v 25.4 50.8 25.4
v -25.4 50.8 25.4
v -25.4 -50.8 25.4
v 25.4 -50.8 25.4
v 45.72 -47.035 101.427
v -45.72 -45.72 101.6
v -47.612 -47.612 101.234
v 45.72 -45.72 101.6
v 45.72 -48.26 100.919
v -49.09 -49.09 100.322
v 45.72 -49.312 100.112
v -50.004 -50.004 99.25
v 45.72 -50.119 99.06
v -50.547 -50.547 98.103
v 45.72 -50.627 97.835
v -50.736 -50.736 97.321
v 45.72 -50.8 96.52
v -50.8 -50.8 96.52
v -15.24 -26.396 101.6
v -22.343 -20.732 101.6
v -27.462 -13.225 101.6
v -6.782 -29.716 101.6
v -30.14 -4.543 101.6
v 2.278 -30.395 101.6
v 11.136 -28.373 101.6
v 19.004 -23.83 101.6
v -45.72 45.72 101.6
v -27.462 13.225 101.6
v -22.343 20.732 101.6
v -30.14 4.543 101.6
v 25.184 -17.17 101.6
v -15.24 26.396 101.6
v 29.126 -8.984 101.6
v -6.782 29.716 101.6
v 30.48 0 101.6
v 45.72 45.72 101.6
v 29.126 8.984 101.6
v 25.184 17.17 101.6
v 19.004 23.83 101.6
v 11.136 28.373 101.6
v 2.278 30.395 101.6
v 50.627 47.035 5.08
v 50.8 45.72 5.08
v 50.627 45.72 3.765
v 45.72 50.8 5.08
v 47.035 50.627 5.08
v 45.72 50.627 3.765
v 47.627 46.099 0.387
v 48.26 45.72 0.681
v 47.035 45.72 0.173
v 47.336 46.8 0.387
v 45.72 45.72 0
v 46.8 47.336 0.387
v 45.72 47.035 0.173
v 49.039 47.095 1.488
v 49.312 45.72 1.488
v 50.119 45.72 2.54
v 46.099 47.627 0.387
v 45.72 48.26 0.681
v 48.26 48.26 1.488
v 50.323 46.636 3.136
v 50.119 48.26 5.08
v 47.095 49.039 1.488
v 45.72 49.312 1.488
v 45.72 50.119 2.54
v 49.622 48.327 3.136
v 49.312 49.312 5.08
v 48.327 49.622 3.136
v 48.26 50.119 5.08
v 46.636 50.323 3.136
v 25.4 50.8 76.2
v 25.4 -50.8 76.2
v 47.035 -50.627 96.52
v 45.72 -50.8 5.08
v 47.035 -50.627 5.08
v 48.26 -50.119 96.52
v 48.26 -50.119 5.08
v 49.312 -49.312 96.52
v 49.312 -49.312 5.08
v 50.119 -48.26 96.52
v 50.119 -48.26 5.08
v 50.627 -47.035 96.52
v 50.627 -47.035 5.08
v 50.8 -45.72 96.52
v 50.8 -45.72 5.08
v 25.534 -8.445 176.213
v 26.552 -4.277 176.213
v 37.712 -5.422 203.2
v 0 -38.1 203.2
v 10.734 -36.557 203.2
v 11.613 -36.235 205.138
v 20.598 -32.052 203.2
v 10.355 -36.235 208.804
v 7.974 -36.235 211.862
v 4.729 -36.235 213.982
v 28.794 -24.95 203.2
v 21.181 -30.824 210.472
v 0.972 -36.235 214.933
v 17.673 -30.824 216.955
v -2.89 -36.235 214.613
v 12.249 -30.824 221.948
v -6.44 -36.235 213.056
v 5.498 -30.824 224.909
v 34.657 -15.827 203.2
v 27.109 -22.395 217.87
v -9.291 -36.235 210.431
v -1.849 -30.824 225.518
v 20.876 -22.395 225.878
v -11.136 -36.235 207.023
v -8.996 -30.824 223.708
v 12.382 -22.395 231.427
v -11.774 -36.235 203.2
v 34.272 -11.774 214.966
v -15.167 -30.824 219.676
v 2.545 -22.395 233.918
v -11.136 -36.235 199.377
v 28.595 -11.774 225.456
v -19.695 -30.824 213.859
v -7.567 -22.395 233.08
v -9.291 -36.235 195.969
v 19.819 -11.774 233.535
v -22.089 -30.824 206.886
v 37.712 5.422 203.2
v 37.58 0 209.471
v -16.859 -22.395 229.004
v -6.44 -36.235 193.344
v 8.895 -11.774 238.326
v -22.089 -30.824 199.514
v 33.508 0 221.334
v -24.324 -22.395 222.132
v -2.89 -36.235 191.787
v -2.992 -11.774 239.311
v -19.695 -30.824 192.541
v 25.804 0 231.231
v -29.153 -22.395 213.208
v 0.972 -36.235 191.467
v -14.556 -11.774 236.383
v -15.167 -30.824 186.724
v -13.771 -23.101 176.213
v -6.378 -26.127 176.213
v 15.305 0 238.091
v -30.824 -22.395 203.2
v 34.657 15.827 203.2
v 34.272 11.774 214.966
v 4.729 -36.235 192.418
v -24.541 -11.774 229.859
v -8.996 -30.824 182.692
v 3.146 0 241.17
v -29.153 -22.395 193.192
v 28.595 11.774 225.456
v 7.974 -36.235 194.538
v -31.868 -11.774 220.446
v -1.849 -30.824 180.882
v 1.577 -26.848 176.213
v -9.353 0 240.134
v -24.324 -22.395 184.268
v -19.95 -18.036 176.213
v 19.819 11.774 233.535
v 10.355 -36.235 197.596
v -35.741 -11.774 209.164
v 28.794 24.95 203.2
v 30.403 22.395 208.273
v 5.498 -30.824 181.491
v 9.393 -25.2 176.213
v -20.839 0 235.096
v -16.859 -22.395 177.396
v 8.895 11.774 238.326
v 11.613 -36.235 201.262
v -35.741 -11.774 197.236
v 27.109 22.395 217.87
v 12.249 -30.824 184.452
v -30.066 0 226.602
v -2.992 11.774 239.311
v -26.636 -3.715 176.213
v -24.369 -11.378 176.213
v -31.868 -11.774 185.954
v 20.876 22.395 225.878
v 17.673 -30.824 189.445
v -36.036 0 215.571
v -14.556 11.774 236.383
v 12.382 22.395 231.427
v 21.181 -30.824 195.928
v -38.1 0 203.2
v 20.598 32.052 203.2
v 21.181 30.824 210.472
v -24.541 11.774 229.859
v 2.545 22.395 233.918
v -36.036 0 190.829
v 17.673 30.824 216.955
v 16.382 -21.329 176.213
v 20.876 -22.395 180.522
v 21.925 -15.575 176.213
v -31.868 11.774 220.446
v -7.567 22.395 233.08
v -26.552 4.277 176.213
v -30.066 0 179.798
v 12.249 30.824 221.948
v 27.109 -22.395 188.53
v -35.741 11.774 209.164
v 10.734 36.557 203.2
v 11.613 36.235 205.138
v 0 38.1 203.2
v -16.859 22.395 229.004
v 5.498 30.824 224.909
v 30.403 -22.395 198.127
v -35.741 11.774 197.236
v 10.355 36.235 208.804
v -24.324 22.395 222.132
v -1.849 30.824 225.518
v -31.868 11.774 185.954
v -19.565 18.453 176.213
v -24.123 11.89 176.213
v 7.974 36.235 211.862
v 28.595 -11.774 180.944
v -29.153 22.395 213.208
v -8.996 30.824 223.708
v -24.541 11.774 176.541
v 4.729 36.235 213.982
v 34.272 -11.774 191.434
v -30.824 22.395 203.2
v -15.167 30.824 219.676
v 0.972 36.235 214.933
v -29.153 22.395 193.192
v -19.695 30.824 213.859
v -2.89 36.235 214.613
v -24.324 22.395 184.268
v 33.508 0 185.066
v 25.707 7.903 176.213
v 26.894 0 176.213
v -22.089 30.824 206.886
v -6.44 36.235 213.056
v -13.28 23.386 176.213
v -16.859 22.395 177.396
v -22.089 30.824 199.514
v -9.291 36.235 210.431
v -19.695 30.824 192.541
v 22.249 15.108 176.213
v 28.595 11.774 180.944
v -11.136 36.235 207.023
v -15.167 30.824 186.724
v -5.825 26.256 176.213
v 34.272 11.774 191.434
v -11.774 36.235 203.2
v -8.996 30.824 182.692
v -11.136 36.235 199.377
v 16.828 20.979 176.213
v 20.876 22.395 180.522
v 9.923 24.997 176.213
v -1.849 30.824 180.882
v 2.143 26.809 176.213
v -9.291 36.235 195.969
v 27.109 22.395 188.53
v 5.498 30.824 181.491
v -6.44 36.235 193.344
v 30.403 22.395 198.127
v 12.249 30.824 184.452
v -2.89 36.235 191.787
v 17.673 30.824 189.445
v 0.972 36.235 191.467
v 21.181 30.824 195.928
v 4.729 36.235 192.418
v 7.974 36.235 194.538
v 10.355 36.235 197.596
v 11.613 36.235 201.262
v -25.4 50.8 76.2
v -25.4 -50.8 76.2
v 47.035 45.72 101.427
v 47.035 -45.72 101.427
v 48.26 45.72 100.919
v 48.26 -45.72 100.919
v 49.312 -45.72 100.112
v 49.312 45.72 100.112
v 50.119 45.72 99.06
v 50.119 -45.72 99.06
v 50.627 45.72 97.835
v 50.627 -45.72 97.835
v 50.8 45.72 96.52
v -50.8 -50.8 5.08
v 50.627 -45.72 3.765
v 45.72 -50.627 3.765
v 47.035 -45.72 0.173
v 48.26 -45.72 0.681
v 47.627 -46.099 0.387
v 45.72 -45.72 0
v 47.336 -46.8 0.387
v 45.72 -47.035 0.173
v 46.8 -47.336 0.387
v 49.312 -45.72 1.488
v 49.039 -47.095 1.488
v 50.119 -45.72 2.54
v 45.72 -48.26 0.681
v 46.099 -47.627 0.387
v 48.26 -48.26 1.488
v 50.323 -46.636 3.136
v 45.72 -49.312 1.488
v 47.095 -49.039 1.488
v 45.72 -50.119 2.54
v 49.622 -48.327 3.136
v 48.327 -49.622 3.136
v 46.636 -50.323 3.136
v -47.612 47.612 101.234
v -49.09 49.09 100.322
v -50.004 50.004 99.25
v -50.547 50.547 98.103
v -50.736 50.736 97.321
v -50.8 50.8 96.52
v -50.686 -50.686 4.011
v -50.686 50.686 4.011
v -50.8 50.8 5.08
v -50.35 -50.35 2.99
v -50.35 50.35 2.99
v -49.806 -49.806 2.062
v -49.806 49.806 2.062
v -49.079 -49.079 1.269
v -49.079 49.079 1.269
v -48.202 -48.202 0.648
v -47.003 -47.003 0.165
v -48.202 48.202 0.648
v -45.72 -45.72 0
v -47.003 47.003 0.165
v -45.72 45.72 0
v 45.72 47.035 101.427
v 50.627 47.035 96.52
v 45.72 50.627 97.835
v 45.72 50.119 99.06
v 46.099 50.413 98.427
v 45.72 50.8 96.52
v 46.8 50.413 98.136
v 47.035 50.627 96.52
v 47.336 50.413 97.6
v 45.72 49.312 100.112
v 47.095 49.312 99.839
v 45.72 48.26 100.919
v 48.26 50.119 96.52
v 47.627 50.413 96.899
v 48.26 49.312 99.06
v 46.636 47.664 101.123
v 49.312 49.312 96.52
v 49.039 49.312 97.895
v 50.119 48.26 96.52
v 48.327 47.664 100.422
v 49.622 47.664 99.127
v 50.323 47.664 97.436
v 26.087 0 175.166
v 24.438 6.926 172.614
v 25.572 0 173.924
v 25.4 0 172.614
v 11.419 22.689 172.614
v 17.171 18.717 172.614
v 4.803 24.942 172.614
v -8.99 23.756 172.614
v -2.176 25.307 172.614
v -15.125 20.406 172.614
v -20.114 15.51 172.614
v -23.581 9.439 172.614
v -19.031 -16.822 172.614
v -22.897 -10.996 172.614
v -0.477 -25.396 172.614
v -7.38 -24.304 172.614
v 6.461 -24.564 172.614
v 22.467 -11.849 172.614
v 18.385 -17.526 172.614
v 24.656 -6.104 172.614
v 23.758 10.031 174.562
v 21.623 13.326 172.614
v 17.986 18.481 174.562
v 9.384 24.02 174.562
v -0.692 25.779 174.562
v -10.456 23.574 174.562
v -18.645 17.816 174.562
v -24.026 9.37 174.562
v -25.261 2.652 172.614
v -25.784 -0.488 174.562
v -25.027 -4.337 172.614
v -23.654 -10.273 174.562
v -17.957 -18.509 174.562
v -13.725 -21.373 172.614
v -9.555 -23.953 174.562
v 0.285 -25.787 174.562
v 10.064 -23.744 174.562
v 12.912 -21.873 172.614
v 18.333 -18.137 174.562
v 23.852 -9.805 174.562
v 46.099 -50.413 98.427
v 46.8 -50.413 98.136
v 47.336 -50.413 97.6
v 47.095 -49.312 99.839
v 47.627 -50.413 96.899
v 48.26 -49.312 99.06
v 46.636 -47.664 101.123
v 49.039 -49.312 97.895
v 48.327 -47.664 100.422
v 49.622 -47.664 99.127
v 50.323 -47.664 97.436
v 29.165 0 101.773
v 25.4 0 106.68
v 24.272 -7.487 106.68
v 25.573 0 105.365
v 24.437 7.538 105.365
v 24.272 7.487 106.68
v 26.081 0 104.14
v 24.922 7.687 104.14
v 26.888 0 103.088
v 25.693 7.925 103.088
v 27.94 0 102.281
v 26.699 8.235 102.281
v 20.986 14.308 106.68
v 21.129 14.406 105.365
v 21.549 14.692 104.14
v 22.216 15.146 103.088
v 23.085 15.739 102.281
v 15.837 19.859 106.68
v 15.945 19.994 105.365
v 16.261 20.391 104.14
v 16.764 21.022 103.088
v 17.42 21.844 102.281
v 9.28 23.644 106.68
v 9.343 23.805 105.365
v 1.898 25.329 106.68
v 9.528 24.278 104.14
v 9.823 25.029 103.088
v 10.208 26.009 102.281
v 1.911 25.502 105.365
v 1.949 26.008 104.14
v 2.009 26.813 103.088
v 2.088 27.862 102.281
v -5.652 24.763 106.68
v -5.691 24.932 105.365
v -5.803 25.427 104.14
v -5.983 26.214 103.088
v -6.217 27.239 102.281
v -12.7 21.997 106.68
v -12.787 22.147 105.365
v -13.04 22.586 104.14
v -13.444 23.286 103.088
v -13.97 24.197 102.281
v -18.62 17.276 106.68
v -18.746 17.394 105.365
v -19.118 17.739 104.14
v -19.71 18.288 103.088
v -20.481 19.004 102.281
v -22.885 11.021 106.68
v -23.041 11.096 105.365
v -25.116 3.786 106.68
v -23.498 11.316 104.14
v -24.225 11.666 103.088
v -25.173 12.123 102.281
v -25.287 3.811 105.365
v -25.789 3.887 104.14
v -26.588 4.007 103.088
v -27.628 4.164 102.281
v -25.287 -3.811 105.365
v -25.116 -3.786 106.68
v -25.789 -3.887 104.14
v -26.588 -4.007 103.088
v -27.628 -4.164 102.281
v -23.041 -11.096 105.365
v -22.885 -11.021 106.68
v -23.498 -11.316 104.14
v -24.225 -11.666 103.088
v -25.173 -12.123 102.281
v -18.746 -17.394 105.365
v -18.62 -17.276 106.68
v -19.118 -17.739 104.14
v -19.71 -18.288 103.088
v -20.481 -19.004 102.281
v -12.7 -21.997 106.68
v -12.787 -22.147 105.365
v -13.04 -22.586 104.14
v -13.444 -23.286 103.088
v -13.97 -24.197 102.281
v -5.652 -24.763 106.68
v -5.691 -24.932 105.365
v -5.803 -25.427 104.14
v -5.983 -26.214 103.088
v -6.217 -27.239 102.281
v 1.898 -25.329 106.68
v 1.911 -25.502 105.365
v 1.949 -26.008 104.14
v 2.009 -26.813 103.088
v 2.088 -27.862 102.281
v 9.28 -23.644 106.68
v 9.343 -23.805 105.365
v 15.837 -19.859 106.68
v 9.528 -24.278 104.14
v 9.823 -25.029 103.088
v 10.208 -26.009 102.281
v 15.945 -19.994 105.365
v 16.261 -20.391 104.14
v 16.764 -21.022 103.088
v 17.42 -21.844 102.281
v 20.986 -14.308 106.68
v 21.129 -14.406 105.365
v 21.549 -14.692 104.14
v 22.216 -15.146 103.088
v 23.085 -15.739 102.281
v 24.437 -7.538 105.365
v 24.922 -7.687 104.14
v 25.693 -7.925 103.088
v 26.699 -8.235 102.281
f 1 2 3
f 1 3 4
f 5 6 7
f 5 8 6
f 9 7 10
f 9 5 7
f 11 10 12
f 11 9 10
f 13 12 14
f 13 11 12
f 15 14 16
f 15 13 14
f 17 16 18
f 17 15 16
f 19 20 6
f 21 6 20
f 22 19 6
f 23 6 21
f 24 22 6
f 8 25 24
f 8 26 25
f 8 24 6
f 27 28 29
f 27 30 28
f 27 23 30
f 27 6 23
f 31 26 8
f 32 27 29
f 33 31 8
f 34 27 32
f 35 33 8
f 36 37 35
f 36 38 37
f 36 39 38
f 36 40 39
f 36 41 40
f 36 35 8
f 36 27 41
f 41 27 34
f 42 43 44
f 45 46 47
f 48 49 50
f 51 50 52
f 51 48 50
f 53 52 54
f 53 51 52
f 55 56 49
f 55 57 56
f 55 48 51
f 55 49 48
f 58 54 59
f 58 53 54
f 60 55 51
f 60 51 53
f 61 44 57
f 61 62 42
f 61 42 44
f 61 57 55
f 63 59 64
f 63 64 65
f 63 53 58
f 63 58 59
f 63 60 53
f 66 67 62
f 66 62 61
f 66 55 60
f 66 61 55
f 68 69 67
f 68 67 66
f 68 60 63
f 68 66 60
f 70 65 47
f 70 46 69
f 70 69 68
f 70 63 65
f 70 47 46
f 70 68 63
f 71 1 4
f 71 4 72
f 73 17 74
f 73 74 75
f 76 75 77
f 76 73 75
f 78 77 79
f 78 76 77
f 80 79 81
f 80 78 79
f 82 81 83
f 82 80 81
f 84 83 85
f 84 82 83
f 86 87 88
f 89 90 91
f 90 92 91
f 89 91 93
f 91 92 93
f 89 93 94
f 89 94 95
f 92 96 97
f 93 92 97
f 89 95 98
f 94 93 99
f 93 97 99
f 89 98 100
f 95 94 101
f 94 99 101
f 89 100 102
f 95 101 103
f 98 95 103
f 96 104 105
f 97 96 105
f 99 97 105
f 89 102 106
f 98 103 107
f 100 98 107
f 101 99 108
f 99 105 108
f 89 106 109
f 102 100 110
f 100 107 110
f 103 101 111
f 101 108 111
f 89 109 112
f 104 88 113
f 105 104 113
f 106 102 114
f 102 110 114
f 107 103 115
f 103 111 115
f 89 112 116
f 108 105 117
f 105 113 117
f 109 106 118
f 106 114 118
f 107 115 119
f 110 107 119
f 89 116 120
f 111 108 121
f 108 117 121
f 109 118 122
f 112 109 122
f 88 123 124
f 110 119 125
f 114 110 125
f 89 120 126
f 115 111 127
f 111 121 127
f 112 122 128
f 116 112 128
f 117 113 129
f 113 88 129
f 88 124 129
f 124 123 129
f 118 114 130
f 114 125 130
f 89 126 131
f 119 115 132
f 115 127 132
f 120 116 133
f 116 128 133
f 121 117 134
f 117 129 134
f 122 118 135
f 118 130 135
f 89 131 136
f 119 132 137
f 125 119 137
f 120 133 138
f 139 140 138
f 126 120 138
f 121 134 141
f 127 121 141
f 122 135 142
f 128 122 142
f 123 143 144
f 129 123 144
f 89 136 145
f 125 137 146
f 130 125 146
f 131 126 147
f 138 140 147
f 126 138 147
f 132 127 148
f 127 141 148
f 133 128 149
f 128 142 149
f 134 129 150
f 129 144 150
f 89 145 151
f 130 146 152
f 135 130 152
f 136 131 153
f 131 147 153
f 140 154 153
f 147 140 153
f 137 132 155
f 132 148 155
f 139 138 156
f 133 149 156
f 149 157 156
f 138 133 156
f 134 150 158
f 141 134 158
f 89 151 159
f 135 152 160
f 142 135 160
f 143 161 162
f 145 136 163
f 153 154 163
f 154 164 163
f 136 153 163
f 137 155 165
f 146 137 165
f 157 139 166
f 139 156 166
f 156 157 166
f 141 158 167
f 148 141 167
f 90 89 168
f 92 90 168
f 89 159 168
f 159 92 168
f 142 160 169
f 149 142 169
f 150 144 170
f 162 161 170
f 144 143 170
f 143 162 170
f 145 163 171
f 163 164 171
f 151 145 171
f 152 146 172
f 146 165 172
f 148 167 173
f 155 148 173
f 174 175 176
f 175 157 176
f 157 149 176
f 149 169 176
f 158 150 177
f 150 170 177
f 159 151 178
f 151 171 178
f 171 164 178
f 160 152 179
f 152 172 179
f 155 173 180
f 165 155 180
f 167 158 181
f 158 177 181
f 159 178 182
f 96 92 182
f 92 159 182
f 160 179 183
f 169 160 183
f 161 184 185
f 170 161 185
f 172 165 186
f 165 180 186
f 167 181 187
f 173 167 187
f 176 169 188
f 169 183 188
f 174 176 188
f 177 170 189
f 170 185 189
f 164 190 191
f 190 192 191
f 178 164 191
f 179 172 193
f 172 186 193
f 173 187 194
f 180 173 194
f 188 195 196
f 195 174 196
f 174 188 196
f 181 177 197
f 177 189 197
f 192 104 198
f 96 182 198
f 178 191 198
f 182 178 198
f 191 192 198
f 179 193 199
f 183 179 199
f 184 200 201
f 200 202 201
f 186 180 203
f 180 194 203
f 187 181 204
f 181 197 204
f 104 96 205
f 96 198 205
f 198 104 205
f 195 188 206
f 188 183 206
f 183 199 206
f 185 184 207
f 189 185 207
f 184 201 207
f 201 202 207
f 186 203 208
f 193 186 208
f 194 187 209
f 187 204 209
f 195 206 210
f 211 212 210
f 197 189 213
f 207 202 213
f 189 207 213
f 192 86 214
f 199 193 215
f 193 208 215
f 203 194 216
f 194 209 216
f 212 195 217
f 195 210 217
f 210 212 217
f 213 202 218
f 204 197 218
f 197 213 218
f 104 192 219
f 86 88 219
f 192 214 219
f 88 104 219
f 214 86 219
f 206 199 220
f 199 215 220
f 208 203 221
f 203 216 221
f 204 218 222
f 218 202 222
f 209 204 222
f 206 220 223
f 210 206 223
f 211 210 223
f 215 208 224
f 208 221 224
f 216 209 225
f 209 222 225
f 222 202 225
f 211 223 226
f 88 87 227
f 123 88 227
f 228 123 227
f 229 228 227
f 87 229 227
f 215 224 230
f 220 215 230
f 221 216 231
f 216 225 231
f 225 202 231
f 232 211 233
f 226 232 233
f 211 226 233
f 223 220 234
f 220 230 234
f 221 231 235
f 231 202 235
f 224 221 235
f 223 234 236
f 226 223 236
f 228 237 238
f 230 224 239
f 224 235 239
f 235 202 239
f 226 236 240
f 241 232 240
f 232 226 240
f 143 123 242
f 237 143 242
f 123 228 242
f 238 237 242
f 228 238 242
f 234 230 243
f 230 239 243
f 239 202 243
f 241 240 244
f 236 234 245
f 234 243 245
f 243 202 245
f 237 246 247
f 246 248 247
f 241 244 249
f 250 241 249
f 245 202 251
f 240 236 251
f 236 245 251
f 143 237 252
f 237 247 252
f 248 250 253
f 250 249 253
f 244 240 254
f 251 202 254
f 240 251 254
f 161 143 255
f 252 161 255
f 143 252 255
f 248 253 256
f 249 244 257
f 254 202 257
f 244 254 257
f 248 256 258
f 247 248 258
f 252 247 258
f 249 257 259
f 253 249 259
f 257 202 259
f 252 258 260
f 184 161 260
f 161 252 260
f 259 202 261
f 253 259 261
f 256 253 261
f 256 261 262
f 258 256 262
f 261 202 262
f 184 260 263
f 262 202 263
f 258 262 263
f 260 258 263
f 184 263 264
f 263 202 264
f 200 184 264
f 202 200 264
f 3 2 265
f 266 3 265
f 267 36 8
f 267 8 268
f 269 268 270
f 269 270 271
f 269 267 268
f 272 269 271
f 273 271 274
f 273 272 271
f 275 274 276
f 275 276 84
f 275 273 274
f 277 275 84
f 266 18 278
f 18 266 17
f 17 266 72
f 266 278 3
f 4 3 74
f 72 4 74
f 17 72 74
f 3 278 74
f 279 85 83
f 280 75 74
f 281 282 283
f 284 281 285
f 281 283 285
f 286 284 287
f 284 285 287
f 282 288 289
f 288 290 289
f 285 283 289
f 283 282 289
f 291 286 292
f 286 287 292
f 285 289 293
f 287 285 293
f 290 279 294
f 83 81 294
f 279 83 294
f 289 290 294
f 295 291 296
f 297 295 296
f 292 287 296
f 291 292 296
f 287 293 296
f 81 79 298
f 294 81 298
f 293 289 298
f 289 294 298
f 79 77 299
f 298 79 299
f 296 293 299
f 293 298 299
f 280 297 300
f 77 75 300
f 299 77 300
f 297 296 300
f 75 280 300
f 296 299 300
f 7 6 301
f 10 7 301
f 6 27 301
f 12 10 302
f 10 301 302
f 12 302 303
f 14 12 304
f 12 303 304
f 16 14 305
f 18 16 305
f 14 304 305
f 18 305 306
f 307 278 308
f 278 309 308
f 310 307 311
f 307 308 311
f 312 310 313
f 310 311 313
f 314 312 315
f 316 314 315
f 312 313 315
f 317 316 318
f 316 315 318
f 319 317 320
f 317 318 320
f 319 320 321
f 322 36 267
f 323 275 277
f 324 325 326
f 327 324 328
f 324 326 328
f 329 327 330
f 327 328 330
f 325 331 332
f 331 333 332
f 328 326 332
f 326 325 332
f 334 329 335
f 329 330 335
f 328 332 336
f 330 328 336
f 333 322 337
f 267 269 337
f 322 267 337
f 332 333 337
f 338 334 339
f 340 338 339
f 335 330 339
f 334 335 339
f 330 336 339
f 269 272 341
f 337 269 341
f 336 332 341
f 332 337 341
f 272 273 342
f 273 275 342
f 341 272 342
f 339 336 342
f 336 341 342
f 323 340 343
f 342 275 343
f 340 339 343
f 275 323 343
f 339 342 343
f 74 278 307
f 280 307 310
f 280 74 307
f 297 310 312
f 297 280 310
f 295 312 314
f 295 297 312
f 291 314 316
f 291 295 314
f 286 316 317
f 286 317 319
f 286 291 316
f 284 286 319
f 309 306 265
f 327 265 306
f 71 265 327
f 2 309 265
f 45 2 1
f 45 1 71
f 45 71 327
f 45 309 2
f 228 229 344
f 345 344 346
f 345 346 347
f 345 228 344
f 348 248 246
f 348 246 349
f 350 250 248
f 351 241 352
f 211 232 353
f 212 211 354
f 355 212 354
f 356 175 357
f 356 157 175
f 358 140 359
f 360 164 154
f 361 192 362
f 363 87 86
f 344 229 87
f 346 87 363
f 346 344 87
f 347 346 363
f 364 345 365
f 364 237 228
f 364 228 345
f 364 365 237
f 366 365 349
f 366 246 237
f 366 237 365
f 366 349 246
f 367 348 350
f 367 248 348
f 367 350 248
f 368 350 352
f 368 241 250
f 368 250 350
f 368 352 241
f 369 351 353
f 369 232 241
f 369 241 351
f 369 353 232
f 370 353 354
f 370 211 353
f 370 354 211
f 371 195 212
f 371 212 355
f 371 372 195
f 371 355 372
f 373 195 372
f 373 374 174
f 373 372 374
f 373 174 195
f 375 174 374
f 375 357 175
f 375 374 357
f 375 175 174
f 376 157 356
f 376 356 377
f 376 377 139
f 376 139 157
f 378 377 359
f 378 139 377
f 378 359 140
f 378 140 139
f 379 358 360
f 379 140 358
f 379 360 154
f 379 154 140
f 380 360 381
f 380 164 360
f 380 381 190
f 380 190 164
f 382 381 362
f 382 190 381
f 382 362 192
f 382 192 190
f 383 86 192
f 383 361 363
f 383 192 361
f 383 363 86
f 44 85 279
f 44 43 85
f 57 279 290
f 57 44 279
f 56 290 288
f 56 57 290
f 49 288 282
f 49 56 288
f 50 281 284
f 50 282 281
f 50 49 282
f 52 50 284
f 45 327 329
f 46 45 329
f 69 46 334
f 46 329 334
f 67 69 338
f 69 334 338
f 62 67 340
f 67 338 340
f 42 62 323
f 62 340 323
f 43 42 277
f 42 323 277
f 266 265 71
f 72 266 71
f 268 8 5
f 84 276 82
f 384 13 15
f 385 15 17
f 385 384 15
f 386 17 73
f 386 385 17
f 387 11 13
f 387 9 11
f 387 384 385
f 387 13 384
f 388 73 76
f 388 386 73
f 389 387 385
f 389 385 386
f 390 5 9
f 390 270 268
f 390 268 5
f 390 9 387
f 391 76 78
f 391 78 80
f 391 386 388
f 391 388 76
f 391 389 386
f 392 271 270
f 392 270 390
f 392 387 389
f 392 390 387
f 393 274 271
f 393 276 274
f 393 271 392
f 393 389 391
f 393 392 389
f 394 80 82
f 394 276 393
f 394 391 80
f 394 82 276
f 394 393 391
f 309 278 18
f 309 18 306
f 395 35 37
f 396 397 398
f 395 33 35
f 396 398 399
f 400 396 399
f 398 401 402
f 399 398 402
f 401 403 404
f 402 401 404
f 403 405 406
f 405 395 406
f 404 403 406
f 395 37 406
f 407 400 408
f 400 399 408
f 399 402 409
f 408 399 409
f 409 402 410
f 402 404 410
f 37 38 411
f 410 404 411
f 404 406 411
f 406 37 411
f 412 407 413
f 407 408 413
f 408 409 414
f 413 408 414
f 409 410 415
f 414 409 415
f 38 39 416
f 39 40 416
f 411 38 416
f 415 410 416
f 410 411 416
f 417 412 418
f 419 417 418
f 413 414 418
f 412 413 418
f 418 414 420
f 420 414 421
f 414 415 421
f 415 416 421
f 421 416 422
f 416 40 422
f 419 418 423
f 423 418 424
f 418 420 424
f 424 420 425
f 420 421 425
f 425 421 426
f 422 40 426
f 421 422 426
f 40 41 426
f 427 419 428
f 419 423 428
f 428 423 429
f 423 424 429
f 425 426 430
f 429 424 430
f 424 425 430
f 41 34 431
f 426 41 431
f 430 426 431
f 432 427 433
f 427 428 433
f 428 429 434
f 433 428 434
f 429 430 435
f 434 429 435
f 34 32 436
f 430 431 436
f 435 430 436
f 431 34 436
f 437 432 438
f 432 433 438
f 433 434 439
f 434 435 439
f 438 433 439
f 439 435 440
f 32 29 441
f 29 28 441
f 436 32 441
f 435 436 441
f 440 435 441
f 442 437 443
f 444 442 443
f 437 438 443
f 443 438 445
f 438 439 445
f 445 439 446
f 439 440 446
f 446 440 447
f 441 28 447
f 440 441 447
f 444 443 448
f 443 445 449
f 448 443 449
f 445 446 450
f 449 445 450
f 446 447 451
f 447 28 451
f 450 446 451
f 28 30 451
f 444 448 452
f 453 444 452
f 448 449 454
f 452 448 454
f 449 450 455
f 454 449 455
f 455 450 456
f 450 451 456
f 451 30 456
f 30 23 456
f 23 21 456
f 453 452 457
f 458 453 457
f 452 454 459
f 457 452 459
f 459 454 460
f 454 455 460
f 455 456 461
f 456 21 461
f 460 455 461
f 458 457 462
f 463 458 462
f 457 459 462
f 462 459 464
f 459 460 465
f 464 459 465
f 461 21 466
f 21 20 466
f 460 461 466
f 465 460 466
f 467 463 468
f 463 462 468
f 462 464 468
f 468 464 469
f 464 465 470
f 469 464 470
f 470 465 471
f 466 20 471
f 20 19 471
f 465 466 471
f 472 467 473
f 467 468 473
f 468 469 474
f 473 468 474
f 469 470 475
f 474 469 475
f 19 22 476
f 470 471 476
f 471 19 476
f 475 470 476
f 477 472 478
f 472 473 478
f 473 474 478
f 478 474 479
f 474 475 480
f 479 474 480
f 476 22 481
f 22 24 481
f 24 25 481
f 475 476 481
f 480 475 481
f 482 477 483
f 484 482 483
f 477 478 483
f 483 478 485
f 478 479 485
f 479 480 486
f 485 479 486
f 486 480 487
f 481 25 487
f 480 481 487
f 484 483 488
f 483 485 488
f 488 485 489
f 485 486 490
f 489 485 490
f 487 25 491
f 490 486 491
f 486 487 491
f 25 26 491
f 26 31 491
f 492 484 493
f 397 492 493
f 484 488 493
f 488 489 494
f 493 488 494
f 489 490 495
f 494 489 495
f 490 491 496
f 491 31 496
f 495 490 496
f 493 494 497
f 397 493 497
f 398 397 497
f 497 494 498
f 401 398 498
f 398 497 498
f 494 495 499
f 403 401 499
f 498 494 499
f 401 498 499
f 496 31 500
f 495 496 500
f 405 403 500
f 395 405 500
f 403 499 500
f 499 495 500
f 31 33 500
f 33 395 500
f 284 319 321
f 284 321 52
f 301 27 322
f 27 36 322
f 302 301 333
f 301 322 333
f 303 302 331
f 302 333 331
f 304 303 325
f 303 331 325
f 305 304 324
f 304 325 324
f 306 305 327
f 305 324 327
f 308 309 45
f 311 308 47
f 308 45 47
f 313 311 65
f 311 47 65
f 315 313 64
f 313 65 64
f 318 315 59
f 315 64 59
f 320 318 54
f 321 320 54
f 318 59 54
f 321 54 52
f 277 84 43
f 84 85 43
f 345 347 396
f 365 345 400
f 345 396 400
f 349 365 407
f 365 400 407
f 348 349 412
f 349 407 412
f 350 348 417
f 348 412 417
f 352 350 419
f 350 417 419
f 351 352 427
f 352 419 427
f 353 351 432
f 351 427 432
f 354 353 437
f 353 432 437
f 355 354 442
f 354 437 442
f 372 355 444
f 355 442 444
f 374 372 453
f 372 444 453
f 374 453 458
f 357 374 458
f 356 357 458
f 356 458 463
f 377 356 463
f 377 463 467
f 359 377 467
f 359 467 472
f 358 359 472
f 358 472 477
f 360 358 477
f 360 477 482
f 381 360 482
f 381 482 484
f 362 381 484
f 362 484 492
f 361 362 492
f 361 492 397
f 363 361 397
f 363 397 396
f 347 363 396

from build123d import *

# Parameters (mm, degrees)
F0_W     = 101.6
F0_H     = 101.6
F1_DEPTH = 101.6
F2_R     = 25.4
F3_DEPTH = 101.6
F6_W     = 50.8
F6_H     = 50.8
F7_DEPTH = 101.6
F8_R     = 5.08


with BuildPart() as f1:
    # F0 (on Top) → F1 (new body)
    with BuildSketch(Plane.XY):
        Rectangle(F0_W, F0_H)
    extrude(amount=F1_DEPTH)

    # F2 (on face) → F3 (join)
    with BuildSketch(Plane.XY.offset(101.6)):
        Circle(F2_R)
    extrude(amount=F3_DEPTH)

    # F4 (on face) → F5 (revolve)
    with BuildSketch(Plane.XY.offset(203.2)):
        with BuildLine():
            Line((0, -25.4), (0, -38.1))
            ThreePointArc((0, -38.1), (38.1, 0), (0, 38.1))
            Line((0, 38.1), (0, 25.4))
            ThreePointArc((0, 25.4), (17.9605122421, 17.9605122421), (25.4, 0))
            ThreePointArc((25.4, 0), (17.9605122421, -17.9605122421), (0, -25.4))
        make_face()
        with BuildLine():
            Line((0, 25.4), (0, -25.4))
            ThreePointArc((0, -25.4), (17.9605122421, -17.9605122421), (25.4, 0))
            ThreePointArc((25.4, 0), (17.9605122421, 17.9605122421), (0, 25.4))
        make_face()
    revolve(axis=Axis((0, 0, 203.2), (0, -1, 0)))

    # F6 (on face) → F7 (cut)
    with BuildSketch(Plane.XZ.offset(50.8)):
        with Locations((0, 50.8)):
            Rectangle(F6_W, F6_H)
    extrude(amount=-F7_DEPTH, mode=Mode.SUBTRACT)

    # F8
    f8_edges = [f1.edges().sort_by_distance(p)[0] for p in [
        (-25.4, 0, 101.6),
        (25.4, 0, 138.200968),
        (-25.4, 0, 174.801937),
        (50.8, 0, 101.6),
        (0, -50.8, 101.6),
        (0, 50.8, 101.6),
        (-50.8, 0, 101.6),
        (50.8, -50.8, 50.8),
        (50.8, 50.8, 50.8),
        (50.8, 0, 0),
        (0, 50.8, 0),
        (-50.8, 0, 0),
        (0, -50.8, 0),
    ]]
    fillet(f8_edges, radius=F8_R)


solid = f1.part
